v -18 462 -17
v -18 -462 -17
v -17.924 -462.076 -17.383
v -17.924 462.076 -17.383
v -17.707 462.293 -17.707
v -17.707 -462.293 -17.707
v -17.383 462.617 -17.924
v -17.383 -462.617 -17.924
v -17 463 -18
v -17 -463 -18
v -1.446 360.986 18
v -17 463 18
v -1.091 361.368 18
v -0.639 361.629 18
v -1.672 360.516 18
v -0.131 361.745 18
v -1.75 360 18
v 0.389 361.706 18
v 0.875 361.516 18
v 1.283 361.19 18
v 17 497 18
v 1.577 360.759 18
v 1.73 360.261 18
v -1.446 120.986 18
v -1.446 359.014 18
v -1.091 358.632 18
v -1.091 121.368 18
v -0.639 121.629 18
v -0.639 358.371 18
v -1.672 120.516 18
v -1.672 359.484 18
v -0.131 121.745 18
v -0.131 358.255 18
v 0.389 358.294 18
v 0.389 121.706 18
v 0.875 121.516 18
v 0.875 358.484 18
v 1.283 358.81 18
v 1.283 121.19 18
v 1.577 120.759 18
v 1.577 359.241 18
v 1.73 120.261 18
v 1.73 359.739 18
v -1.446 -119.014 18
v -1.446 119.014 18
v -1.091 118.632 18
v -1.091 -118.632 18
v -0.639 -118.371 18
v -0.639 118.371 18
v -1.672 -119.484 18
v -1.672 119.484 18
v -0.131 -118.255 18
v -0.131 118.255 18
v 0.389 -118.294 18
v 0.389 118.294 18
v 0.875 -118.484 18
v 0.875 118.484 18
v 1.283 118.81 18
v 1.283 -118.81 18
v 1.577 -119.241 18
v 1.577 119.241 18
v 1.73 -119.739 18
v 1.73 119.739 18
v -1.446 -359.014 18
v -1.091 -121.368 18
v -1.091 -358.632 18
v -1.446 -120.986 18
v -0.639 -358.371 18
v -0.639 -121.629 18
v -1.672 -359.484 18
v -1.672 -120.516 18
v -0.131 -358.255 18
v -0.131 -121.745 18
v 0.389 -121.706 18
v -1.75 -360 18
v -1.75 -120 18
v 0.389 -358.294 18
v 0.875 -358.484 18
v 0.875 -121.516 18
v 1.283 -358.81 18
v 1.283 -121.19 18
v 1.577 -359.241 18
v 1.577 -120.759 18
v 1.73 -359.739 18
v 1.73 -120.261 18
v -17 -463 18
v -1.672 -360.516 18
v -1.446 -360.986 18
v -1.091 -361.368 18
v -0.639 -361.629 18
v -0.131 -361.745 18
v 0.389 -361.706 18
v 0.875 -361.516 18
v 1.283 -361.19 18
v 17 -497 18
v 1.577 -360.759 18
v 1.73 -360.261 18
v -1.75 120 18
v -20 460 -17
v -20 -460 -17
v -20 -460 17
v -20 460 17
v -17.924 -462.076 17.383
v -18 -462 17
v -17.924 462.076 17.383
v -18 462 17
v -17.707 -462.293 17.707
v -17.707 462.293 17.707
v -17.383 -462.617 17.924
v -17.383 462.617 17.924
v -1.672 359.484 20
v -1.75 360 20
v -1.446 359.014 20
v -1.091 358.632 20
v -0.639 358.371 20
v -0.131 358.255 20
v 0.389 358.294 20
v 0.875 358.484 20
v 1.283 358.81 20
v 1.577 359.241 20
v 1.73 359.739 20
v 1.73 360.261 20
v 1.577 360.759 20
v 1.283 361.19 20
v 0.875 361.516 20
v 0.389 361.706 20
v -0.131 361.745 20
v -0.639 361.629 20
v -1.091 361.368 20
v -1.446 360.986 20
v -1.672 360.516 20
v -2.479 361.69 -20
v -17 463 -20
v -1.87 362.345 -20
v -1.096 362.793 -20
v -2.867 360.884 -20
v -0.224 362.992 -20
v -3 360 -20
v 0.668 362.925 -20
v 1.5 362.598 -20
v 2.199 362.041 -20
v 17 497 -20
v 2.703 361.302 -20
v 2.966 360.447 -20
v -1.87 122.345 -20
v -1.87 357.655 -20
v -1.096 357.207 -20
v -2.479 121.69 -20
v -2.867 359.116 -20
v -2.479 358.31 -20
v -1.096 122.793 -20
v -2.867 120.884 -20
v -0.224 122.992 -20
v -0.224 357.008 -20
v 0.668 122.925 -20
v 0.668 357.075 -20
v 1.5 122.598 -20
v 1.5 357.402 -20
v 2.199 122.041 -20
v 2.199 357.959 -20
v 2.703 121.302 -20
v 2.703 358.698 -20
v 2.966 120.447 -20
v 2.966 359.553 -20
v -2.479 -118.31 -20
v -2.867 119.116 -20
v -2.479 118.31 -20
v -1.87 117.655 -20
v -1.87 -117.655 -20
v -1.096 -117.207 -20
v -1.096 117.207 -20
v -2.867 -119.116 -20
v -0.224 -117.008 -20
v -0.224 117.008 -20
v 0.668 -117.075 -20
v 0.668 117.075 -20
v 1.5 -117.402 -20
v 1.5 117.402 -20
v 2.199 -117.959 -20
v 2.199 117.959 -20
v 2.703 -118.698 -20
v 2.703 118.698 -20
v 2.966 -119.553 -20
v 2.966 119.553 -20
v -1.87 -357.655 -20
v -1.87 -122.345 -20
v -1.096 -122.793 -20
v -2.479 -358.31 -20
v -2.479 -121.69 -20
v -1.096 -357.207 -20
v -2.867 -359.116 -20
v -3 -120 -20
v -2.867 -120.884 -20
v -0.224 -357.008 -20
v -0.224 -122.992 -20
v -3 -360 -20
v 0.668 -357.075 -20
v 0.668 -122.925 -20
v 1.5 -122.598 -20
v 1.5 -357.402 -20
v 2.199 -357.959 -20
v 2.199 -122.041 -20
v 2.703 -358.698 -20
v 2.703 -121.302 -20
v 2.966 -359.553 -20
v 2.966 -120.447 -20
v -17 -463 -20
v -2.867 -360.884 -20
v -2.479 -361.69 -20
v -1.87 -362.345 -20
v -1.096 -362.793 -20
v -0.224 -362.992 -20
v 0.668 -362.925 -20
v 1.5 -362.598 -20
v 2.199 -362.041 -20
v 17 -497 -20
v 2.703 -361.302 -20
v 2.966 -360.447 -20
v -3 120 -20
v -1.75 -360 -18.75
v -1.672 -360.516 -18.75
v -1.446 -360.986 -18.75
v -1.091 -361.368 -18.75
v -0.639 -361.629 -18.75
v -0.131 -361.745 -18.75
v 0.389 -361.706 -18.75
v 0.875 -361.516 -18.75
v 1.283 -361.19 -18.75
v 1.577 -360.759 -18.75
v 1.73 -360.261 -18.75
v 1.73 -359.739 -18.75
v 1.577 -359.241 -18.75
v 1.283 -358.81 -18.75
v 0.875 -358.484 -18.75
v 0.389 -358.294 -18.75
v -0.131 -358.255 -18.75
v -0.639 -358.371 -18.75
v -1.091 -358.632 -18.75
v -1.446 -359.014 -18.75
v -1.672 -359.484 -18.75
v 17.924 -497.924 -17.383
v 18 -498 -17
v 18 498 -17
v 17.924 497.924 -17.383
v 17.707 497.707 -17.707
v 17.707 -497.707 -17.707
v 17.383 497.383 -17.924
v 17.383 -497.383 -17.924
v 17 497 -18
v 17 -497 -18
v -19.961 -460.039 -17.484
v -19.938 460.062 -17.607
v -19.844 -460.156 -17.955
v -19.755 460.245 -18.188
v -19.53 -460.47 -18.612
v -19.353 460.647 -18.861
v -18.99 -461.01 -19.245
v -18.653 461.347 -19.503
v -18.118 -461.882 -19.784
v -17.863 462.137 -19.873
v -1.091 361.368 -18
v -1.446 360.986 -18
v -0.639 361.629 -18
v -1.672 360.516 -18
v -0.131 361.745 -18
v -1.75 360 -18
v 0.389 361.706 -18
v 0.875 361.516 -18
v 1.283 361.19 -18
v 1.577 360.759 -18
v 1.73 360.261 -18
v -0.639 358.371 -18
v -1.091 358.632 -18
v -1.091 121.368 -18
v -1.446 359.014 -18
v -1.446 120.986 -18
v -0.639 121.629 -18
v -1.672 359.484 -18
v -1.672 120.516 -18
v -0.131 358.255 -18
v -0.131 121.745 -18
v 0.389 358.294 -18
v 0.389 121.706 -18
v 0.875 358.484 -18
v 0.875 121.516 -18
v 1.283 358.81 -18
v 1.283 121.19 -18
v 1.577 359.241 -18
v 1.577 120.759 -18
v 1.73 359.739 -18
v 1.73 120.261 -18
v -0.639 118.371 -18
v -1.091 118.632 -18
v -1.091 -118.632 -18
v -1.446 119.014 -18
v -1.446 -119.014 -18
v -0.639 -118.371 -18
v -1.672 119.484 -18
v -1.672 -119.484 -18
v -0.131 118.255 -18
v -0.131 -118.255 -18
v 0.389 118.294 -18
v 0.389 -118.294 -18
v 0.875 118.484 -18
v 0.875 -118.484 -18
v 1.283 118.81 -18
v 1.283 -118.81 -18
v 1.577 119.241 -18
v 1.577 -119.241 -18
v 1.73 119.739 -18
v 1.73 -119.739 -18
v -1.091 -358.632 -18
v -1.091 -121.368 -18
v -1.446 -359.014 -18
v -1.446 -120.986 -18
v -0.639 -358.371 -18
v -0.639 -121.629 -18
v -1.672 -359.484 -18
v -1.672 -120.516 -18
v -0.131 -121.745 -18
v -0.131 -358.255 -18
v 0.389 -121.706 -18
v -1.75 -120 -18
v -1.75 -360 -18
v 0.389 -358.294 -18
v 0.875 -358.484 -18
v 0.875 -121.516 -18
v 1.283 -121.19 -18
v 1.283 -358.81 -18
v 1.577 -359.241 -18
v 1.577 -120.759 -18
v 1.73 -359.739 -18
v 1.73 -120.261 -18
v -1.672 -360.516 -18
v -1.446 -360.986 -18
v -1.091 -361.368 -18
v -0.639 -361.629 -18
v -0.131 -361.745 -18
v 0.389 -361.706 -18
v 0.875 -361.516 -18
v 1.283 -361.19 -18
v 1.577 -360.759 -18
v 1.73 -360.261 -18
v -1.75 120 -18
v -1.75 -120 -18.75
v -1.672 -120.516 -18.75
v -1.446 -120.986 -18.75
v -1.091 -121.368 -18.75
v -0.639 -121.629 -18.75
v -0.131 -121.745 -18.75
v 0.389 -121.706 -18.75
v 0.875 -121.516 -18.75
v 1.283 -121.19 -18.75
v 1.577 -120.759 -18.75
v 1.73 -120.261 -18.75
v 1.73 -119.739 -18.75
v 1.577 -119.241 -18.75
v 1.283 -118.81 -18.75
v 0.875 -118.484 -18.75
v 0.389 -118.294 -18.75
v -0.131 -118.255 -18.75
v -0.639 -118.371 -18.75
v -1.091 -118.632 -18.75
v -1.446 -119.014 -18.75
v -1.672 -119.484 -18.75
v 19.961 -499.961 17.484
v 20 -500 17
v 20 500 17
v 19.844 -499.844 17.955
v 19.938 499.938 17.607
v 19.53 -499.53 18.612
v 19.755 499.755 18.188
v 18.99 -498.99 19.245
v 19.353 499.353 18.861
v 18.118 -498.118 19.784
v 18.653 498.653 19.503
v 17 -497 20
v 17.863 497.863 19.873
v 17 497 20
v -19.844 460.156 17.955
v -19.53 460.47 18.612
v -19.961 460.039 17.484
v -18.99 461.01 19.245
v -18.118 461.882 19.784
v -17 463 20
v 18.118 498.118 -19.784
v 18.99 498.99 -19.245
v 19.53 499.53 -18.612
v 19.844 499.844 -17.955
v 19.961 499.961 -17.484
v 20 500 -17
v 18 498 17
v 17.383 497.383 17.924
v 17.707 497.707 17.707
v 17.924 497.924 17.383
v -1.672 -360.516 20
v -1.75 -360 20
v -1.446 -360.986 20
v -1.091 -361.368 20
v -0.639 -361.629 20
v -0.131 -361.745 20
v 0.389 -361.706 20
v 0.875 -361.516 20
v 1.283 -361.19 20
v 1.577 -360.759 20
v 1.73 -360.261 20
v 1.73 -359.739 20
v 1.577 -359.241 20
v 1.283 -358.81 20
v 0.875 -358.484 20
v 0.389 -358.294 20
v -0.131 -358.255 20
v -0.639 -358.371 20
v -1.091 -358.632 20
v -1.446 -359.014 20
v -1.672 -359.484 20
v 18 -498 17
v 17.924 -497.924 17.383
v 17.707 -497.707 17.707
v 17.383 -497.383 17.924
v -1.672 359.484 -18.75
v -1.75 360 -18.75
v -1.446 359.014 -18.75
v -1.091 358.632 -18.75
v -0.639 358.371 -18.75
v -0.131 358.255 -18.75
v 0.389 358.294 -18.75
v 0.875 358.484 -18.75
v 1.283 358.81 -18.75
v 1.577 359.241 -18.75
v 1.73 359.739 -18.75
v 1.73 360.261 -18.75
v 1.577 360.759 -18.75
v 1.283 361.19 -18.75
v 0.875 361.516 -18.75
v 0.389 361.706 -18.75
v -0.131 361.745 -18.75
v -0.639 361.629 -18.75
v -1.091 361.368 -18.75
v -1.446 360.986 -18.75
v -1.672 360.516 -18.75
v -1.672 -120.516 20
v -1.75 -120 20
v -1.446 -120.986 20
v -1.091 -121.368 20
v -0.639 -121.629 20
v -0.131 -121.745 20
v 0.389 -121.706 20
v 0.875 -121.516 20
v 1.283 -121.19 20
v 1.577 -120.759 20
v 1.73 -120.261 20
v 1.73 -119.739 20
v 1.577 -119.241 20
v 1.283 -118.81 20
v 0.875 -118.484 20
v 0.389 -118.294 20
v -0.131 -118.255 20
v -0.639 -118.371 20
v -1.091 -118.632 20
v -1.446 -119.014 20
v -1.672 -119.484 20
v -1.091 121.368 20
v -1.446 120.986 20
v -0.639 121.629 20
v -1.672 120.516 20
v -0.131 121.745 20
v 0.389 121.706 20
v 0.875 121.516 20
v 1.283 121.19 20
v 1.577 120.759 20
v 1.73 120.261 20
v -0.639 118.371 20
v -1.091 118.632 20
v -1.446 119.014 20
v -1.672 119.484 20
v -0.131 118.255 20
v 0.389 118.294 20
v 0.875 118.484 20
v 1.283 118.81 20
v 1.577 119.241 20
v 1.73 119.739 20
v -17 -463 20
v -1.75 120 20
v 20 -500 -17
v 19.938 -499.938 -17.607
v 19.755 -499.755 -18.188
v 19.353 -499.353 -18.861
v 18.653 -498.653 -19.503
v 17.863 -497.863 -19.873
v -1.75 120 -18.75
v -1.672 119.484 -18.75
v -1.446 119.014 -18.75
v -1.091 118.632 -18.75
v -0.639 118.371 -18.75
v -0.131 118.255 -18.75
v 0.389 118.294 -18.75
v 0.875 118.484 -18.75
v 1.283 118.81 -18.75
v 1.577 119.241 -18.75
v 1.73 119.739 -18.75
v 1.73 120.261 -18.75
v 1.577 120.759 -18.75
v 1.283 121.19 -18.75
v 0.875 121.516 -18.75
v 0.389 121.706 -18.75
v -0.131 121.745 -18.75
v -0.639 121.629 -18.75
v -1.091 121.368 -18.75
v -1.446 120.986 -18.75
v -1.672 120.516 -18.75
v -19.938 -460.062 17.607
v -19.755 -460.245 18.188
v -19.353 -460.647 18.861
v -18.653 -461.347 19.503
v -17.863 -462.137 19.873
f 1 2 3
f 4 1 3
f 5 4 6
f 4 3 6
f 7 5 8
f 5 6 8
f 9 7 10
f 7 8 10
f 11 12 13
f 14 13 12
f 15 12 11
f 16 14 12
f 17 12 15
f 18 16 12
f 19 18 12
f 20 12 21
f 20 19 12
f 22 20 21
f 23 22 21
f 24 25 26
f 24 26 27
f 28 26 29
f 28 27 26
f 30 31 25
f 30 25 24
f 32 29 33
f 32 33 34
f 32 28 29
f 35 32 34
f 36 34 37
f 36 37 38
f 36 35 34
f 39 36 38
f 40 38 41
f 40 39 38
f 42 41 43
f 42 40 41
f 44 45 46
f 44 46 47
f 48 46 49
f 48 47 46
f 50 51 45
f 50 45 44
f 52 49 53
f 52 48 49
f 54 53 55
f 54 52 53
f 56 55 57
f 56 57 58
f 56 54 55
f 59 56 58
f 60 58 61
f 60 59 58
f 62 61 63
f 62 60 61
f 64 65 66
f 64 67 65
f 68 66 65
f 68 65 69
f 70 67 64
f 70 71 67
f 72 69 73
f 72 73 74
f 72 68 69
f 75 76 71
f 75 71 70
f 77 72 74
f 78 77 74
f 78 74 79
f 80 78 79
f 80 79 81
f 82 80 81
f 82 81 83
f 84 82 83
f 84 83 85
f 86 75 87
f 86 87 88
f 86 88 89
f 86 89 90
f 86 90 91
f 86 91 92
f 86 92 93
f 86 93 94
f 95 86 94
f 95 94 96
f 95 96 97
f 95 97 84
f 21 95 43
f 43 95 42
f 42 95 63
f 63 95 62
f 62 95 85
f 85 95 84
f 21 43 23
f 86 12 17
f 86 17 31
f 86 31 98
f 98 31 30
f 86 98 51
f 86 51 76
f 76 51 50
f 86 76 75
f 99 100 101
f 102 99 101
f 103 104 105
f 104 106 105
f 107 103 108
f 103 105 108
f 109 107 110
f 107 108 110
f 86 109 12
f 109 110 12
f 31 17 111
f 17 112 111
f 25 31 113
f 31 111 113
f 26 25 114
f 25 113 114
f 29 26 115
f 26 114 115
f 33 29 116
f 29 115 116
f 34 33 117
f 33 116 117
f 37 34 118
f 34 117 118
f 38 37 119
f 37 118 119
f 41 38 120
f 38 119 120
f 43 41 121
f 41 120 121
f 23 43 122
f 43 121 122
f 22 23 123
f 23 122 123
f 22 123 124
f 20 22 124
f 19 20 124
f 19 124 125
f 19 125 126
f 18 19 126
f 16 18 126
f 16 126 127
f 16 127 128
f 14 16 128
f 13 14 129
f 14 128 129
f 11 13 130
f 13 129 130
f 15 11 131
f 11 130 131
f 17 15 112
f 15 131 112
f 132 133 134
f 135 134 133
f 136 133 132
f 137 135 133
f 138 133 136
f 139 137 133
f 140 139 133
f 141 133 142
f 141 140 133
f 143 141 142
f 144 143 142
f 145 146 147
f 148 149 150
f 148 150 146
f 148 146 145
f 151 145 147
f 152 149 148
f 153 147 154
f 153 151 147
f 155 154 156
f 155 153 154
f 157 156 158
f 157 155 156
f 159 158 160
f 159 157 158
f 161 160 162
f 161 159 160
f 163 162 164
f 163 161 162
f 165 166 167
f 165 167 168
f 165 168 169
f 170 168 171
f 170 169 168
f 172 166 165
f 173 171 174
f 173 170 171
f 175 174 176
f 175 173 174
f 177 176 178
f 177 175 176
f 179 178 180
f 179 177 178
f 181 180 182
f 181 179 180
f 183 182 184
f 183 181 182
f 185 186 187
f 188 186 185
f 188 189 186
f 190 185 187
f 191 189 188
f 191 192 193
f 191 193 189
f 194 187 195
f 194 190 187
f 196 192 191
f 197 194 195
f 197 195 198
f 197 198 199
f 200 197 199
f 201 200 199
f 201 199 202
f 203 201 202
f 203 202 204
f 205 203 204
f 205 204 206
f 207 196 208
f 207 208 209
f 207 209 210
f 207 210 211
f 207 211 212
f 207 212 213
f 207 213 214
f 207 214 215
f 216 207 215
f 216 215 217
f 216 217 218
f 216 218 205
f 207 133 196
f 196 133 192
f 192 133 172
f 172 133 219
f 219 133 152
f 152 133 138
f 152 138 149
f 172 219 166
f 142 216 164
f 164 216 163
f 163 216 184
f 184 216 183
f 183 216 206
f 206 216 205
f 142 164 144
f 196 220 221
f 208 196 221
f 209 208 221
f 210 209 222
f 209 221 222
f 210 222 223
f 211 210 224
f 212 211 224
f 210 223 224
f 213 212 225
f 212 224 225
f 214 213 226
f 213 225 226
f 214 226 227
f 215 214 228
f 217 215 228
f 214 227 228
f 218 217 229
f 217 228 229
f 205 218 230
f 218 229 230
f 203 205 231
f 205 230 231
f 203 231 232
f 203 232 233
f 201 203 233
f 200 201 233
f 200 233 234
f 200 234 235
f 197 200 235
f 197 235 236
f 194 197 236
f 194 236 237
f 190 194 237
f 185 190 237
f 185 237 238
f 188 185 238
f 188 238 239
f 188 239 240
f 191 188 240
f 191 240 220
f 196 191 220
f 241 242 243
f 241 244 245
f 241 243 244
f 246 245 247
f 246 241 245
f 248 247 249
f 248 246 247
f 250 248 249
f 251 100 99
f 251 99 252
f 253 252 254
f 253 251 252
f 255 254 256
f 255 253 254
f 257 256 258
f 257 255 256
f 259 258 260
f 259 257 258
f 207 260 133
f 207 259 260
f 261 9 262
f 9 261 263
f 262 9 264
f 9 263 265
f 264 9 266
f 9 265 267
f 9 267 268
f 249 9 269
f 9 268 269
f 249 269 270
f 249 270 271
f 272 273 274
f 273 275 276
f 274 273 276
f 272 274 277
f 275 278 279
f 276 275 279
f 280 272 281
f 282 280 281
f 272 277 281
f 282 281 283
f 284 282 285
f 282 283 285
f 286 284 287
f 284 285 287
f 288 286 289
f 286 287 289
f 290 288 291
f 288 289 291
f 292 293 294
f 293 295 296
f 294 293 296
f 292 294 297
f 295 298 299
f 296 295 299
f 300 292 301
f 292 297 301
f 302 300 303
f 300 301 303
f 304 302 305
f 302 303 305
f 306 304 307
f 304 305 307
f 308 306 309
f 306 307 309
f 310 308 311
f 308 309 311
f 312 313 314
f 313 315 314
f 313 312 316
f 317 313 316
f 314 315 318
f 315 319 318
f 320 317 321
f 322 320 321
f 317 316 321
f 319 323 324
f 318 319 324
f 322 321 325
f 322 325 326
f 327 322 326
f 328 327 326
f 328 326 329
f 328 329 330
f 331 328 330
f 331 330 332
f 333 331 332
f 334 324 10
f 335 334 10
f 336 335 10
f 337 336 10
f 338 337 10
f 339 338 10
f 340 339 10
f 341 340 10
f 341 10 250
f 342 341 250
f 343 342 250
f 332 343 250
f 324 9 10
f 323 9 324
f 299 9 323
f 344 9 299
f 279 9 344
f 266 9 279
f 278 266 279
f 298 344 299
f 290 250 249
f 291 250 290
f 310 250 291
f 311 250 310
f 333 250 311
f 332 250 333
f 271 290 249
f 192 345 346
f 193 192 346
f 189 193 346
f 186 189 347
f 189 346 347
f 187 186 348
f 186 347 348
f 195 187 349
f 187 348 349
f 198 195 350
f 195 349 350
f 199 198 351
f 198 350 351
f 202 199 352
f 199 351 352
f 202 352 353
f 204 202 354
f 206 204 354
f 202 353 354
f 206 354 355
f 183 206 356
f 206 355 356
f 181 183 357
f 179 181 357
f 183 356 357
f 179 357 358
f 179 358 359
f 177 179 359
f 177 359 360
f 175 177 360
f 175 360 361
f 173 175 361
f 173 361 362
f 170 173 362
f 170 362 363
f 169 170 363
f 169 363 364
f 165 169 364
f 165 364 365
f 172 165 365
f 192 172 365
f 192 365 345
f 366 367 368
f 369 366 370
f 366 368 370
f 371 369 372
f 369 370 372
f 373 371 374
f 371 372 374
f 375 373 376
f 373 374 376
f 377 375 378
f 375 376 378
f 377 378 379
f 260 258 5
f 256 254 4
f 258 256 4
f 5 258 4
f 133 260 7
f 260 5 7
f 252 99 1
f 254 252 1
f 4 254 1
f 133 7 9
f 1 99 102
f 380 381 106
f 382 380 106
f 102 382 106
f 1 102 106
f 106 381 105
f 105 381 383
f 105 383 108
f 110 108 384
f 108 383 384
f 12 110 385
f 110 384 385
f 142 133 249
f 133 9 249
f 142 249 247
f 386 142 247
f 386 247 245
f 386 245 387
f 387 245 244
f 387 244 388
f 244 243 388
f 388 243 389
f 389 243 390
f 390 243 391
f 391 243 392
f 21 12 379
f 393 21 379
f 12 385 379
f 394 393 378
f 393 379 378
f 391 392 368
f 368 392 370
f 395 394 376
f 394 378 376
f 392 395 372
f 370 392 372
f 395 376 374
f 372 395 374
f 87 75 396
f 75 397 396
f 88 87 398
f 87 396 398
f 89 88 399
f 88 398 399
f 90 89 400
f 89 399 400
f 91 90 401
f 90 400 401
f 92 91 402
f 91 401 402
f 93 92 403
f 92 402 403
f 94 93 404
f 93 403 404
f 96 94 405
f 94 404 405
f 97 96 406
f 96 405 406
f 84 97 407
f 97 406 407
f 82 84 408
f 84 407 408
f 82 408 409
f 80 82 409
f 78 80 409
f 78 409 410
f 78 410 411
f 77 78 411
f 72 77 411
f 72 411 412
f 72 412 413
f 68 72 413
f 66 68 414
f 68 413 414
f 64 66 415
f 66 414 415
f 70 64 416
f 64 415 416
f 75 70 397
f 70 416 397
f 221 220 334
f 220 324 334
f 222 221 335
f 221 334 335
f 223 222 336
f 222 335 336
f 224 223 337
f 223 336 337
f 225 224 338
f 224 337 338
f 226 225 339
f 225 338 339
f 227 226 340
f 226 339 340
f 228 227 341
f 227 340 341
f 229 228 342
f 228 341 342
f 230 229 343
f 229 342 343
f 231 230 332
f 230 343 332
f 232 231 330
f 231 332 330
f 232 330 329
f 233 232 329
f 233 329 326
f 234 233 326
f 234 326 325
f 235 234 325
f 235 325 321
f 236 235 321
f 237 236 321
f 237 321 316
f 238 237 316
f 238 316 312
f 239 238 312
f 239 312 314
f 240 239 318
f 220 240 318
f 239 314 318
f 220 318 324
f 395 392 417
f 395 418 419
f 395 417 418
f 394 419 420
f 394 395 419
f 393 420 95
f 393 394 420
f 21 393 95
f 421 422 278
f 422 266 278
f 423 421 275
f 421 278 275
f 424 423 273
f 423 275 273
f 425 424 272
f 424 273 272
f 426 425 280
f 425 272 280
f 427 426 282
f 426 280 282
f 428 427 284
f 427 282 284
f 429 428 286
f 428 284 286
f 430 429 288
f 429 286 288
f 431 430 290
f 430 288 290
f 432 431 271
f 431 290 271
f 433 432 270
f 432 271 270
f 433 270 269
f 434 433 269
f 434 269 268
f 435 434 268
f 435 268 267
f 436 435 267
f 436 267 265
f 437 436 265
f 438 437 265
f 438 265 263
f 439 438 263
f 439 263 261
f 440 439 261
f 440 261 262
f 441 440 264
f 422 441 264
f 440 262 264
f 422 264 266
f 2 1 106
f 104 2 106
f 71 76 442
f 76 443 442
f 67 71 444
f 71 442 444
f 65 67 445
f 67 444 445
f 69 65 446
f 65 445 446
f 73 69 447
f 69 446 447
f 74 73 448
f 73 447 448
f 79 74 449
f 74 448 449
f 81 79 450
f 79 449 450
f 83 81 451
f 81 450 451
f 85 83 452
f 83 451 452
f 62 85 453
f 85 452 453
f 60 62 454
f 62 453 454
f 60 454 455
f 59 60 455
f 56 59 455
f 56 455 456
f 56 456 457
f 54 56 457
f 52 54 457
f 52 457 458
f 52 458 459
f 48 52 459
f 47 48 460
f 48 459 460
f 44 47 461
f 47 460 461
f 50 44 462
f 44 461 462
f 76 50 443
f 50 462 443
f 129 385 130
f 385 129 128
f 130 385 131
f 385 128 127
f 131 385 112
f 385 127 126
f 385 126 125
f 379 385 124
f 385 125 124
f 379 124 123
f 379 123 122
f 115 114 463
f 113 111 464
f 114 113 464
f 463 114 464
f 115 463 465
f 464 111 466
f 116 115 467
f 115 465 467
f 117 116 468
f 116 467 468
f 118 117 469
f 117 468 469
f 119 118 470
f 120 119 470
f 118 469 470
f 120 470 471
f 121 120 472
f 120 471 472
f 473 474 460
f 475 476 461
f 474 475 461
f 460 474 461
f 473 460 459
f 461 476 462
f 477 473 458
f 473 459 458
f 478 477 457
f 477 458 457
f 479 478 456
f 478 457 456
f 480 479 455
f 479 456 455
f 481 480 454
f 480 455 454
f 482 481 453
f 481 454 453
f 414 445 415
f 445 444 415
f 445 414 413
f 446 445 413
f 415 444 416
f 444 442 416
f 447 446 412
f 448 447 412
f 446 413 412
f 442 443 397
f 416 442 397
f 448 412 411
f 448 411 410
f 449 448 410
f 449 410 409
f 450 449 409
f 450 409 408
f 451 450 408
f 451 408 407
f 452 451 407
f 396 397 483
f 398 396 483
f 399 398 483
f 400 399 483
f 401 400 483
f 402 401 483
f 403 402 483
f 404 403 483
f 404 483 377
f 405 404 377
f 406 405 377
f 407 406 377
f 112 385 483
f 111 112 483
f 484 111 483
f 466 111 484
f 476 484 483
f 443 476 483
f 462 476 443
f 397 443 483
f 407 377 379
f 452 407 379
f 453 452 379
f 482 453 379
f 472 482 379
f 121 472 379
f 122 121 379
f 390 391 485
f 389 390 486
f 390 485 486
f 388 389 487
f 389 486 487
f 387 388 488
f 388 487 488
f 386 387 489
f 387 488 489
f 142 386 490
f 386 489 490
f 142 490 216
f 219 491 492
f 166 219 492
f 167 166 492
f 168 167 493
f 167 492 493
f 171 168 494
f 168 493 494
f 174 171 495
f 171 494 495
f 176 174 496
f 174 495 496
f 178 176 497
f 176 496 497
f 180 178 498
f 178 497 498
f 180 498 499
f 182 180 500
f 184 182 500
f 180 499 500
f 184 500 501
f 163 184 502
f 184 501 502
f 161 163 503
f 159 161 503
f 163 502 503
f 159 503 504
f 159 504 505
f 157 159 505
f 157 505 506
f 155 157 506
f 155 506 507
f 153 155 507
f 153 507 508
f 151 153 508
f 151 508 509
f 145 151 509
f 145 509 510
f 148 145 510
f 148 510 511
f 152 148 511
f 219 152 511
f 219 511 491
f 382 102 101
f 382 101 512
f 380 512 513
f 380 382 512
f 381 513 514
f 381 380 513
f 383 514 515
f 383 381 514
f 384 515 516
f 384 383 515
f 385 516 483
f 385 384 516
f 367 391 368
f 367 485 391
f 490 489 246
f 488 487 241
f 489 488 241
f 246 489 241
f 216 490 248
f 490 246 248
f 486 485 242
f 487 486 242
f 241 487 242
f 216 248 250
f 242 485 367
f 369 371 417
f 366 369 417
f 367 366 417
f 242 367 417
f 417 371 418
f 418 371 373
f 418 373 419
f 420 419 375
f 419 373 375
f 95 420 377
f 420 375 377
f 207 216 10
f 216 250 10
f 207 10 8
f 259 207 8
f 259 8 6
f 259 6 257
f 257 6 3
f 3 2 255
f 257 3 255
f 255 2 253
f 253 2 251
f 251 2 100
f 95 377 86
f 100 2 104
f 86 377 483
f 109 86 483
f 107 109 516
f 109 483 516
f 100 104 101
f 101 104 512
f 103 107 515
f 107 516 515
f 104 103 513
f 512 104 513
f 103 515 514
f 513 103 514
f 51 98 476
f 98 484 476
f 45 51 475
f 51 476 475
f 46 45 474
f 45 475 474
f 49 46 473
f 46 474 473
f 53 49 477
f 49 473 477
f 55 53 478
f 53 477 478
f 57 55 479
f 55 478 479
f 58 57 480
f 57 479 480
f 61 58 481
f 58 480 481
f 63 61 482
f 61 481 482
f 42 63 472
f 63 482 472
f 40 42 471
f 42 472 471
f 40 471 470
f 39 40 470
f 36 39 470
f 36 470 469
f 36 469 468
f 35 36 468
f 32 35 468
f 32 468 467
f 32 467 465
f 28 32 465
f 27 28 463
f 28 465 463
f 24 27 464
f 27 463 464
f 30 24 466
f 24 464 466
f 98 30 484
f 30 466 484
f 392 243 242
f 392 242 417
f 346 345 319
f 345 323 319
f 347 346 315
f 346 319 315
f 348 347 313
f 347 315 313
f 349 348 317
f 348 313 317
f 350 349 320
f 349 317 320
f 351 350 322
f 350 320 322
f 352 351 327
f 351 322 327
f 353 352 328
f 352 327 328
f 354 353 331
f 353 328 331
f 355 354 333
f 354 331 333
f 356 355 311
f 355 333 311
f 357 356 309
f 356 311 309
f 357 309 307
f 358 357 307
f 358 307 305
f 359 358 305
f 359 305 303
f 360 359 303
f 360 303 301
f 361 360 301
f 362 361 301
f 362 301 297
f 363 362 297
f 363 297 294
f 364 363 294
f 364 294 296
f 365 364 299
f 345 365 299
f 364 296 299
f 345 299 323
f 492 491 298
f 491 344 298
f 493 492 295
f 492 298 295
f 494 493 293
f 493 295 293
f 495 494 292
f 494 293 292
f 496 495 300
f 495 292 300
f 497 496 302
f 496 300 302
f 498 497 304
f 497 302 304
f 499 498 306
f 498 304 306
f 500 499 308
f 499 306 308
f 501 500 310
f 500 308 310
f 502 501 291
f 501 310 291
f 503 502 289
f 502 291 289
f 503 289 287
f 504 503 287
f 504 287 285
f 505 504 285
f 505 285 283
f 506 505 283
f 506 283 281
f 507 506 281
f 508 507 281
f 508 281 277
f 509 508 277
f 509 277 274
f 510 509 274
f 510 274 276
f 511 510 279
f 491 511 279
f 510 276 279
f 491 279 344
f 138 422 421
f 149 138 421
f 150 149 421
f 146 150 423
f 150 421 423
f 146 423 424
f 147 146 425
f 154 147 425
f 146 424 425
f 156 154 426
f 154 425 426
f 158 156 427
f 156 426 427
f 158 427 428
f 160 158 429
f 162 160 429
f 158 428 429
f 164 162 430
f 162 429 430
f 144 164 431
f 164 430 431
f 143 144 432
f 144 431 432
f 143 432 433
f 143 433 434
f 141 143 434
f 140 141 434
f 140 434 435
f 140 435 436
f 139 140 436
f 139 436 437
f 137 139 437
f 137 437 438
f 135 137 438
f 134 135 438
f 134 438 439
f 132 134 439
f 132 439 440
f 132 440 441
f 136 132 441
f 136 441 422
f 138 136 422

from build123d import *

# Parameters (mm, degrees)
F2_W           = 40
F2_H           = 40
F3_DEPTH       = 500
F4_R           = 3
F5_T           = -2
F7_DEPTH       = 40.001
F9_D           = 3.5
F9_CSINK_D     = 6
F9_CSINK_ANGLE = 90


with BuildPart() as f3:
    # F2 (on Front) → F3 (new body, symmetric)
    with BuildSketch(Plane.XZ):
        Rectangle(F2_W, F2_H)
    extrude(amount=F3_DEPTH, both=True)

    # F4
    f4_edges = [f3.edges().sort_by_distance(p)[0] for p in [
        (20, 0, 20),
        (-20, 0, 20),
        (20, 0, -20),
        (-20, 0, -20),
    ]]
    fillet(f4_edges, radius=F4_R)

    # F5
    f5_openings = [f3.faces().sort_by_distance(p)[0] for p in [
        (0, -500, 0),
        (0, 500, 0),
    ]]
    offset(amount=F5_T, openings=f5_openings)

    # F6 (on face) → F7 (cut, through all)
    with BuildSketch(Plane.XY.offset(20)):
        Polygon((20, 500), (-20, 500), (-20, 460), align=None)
        Polygon((20, -500), (-20, -460), (-20, -500), align=None)
    extrude(amount=-F7_DEPTH, mode=Mode.SUBTRACT)

    # F9 (through all)
    with Locations(Plane(origin=(0, 0, -20), x_dir=(1, 0, 0), z_dir=(0, 0, -1))):
        with Locations((0, 360), (0, 120), (0, -120), (0, -360)):
            CounterSinkHole(F9_D / 2, F9_CSINK_D / 2, counter_sink_angle=F9_CSINK_ANGLE)


solid = f3.part
